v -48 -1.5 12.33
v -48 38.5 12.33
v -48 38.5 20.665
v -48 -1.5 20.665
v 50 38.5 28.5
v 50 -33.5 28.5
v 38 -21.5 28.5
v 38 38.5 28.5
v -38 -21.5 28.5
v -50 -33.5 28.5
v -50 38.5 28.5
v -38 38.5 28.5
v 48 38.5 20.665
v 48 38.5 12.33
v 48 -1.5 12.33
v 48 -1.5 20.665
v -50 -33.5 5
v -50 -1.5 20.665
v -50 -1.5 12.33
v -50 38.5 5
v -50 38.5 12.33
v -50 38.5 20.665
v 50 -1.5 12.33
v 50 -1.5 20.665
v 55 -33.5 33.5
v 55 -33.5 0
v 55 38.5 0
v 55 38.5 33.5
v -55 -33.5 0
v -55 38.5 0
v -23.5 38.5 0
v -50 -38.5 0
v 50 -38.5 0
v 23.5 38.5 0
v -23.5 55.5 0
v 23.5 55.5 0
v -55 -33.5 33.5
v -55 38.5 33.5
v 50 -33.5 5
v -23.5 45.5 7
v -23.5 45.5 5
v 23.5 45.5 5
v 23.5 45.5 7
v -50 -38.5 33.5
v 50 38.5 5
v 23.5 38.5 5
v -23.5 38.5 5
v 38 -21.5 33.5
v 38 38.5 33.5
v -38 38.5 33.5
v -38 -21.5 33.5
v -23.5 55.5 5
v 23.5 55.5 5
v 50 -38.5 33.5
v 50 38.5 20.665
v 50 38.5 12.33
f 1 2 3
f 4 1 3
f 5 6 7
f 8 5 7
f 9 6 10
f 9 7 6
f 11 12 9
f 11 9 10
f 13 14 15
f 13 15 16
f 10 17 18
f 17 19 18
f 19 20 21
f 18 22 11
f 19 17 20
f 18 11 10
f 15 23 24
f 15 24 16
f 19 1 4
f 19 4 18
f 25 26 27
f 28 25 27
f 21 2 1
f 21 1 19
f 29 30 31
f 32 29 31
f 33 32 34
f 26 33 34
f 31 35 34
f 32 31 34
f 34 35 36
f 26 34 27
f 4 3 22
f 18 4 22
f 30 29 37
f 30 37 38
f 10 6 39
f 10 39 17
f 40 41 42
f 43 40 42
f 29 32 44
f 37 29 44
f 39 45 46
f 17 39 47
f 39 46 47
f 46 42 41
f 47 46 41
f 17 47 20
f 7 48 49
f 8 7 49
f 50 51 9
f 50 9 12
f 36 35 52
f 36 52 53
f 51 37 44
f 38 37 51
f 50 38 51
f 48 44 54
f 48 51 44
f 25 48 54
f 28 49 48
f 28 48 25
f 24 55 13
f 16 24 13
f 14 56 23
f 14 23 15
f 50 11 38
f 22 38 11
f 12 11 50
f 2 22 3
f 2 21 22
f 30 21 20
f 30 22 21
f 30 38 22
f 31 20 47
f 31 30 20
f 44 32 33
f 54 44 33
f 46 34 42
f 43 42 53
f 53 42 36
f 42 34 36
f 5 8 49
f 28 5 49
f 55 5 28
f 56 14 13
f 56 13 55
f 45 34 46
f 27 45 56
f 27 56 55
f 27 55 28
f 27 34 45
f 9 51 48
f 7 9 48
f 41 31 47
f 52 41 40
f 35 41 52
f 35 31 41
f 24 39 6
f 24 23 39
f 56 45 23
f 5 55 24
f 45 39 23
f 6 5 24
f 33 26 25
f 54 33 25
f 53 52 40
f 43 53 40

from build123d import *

# Parameters (mm, degrees)
F0_W      = 110
F0_H      = 77
F1_DEPTH  = 33.5
F2_W      = 100
F2_H      = 23.5
F4_DEPTH  = 72
F3_W      = 2
F3_H      = 8.335
F5_DEPTH  = 40
F6_W      = 76
F6_H      = 60
F7_DEPTH  = 20.9
F8_W      = 47
F8_H      = 5
F9_DEPTH  = 17
F10_W     = 47
F10_H     = 10
F11_DEPTH = 2
F13_DEPTH = 55.8
F14_SIZE  = 5


with BuildPart() as f1:
    # F0 (on Top) → F1 (new body)
    with BuildSketch(Plane.XY):
        Rectangle(F0_W, F0_H)
    extrude(amount=F1_DEPTH)

    # F2 (on face) → F4 (cut)
    with BuildSketch(Plane(origin=(0, 38.5, 0), x_dir=(-1, 0, 0), z_dir=(0, 1, 0))):
        with Locations((0, 16.75)):
            Rectangle(F2_W, F2_H)
    extrude(amount=-F4_DEPTH, mode=Mode.SUBTRACT)

    # F3 (on face) → F5 (join)
    with BuildSketch(Plane(origin=(0, 38.5, 0), x_dir=(-1, 0, 0), z_dir=(0, 1, 0))):
        with Locations((49, 16.4975)):
            Rectangle(F3_W, F3_H)
        with Locations((-49, 16.4975)):
            Rectangle(F3_W, F3_H)
    extrude(amount=-F5_DEPTH)

    # F6 (on face) → F7 (cut)
    with BuildSketch(Plane.XY.offset(33.5)):
        with Locations((0, 8.5)):
            Rectangle(F6_W, F6_H)
    extrude(amount=-F7_DEPTH, mode=Mode.SUBTRACT)

    # F8 (on face) → F9 (join)
    with BuildSketch(Plane(origin=(0, 38.5, 0), x_dir=(-1, 0, 0), z_dir=(0, 1, 0))):
        with Locations((0, 2.5)):
            Rectangle(F8_W, F8_H)
    extrude(amount=F9_DEPTH)

    # F10 (on face) → F11 (join)
    with BuildSketch(Plane.XY.offset(5)):
        with Locations((0, 50.5)):
            Rectangle(F10_W, F10_H)
    extrude(amount=F11_DEPTH)

    # F12 (on face) → F13 (cut)
    with BuildSketch(Plane(origin=(-23.5, 0, 0), x_dir=(0, -1, 0), z_dir=(-1, 0, 0))):
        Polygon((-55.5, 7), (-55.5, 5), (-45.5, 7), align=None)
    extrude(amount=-F13_DEPTH, mode=Mode.SUBTRACT)

    # F14
    f14_edges = [f1.edges().sort_by_distance(p)[0] for p in [
        (55, -38.5, 16.75),
        (-55, -38.5, 16.75),
    ]]
    chamfer(f14_edges, length=F14_SIZE)


solid = f1.part
